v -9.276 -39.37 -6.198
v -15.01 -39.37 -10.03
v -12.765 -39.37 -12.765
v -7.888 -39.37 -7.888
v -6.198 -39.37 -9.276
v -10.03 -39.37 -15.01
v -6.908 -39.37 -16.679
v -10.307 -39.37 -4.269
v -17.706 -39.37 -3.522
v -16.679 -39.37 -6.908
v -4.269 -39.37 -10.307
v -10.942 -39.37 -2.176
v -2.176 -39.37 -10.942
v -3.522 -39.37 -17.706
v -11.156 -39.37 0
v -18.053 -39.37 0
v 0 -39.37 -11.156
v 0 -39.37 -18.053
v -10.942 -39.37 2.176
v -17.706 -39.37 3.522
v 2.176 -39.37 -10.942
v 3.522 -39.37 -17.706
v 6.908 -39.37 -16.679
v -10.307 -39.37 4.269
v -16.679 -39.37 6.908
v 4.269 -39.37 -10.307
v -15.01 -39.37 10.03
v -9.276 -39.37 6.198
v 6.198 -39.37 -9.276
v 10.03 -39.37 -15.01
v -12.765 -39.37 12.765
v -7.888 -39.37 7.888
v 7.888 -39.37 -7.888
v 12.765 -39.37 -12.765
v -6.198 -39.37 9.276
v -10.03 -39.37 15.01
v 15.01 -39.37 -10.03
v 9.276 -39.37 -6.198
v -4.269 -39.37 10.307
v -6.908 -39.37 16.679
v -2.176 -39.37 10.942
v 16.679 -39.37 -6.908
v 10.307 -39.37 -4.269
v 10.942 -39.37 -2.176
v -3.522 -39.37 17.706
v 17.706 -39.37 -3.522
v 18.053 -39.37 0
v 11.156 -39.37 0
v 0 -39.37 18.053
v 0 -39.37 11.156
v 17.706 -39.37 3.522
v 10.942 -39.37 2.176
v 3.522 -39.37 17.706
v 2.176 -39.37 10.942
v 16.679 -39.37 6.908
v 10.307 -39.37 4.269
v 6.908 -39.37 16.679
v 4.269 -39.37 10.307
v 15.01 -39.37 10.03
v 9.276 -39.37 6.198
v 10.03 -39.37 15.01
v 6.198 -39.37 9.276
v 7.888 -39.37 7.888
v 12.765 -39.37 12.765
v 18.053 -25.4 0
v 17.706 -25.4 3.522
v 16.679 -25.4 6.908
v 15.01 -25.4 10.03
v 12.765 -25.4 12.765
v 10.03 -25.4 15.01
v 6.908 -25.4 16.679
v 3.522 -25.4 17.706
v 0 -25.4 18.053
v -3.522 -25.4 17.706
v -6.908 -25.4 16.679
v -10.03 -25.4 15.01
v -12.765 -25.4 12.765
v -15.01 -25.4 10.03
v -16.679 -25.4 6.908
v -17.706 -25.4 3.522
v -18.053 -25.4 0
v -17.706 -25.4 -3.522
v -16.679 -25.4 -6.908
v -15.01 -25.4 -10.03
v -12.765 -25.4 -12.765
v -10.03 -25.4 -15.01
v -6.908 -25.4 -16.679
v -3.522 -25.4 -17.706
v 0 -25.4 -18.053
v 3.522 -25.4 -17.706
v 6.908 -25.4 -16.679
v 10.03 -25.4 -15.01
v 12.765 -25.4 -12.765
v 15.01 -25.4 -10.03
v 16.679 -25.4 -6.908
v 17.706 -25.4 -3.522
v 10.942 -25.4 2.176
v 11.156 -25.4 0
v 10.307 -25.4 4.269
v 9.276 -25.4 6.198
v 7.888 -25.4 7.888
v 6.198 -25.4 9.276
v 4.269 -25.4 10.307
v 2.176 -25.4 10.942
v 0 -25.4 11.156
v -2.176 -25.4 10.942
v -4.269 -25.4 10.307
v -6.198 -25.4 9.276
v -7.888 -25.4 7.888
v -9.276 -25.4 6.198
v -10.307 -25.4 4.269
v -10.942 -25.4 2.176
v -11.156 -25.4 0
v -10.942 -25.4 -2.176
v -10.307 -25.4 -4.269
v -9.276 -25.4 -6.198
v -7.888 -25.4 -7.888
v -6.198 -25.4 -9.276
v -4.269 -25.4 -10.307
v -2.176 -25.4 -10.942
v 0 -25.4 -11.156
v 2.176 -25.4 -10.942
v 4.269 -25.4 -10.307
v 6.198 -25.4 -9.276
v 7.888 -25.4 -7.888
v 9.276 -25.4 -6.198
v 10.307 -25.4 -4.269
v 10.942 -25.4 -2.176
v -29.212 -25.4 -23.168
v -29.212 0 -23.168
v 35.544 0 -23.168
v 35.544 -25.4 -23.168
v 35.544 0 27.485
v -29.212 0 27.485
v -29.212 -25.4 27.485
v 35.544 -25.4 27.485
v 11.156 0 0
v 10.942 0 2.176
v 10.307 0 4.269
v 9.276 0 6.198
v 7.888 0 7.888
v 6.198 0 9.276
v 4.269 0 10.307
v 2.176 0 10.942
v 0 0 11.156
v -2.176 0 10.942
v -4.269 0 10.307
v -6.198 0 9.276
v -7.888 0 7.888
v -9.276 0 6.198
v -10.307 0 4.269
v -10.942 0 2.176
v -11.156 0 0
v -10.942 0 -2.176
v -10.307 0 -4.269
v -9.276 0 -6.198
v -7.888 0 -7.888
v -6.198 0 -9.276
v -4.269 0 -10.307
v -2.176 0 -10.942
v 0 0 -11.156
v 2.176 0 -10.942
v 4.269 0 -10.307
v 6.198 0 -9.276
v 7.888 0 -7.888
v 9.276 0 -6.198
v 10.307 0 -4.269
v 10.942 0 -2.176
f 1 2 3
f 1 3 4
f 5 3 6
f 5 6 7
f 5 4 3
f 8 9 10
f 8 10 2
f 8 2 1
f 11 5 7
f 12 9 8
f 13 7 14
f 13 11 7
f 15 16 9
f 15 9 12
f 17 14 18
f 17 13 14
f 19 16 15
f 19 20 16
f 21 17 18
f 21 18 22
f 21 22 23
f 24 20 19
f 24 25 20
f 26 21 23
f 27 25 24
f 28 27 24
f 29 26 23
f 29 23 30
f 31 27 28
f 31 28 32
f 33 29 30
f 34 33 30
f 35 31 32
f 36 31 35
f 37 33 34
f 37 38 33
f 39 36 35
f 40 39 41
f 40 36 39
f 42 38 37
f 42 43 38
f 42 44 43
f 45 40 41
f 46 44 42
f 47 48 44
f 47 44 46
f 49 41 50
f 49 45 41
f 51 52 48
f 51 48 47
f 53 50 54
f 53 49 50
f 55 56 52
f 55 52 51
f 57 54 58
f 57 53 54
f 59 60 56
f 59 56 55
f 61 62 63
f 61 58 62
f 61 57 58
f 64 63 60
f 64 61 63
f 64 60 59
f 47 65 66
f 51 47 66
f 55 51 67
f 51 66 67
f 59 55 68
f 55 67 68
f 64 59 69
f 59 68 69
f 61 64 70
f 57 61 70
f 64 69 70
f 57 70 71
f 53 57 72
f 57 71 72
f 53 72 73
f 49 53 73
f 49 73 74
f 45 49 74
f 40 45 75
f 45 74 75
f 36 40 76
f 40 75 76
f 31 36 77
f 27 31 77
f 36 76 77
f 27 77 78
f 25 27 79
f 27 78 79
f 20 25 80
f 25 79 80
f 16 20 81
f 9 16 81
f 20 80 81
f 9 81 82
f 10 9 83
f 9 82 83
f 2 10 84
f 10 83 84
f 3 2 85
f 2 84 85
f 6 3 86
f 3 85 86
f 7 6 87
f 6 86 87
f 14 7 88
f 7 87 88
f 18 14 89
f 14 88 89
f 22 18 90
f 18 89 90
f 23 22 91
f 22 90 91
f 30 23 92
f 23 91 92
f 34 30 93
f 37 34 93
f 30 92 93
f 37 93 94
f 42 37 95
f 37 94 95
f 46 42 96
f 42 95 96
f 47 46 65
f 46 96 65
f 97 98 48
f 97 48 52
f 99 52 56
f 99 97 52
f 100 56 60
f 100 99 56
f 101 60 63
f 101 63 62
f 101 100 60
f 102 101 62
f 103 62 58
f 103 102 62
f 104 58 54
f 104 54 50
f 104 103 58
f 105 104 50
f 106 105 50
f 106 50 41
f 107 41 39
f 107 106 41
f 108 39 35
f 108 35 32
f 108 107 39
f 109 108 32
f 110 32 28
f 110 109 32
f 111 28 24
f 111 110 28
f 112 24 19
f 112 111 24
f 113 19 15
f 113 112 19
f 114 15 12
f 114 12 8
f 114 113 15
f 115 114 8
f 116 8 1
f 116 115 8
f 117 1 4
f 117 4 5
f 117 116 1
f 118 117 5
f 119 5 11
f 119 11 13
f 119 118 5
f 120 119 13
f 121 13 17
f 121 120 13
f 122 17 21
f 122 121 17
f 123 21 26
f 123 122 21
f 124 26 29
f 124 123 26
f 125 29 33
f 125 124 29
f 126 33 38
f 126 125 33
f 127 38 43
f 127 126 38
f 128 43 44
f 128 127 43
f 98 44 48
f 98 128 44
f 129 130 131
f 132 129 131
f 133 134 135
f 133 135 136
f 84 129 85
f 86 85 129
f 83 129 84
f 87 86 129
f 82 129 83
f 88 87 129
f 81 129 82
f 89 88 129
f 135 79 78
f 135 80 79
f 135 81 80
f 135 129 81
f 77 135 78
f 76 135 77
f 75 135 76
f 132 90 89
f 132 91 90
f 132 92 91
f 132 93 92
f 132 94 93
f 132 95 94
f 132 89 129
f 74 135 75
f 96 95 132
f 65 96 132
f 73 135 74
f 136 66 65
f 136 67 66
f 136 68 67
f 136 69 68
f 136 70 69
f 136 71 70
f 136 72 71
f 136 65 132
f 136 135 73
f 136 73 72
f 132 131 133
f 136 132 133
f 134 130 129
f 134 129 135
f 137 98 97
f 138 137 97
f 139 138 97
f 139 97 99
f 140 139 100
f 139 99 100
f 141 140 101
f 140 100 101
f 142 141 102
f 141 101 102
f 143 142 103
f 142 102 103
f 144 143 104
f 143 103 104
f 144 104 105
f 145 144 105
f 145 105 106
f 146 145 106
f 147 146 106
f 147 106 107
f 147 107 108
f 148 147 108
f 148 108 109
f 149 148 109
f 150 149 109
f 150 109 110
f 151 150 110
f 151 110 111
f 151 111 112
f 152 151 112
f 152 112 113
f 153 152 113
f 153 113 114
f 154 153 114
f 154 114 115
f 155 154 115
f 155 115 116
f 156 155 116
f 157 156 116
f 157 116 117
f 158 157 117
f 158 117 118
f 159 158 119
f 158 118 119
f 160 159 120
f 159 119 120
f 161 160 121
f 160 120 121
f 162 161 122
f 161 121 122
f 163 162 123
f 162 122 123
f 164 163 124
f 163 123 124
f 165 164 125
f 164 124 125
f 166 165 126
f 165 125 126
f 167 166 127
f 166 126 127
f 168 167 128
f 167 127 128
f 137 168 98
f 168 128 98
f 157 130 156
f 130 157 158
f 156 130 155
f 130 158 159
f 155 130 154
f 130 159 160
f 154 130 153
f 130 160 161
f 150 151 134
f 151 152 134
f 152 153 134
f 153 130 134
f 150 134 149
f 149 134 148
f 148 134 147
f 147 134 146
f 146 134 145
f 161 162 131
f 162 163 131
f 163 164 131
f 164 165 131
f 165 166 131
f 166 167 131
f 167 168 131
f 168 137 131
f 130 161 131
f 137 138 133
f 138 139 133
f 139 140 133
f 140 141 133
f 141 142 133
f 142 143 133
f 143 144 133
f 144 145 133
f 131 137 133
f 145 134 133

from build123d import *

# Parameters (mm, degrees)
F0_W     = 64.7562947124
F0_H     = 50.6538115442
F1_DEPTH = 25.4
F2_R     = 11.1559539437
F3_DEPTH = 50.292
F4_R     = 18.0527377002
F4_R_2   = 11.1559539437
F5_DEPTH = 13.97


with BuildPart() as f1:
    # F0 (on Front) → F1 (new body)
    with BuildSketch(Plane.XZ):
        with Locations((3.1658643857, 2.158543095)):
            Rectangle(F0_W, F0_H)
    extrude(amount=F1_DEPTH)

    # F2 (on face) → F3 (cut)
    with BuildSketch(Plane.XZ.offset(25.4)):
        Circle(F2_R)
    extrude(amount=-F3_DEPTH, mode=Mode.SUBTRACT)

    # F4 (on face) → F5 (join)
    with BuildSketch(Plane.XZ.offset(25.4)):
        Circle(F4_R)
        Circle(F4_R_2, mode=Mode.SUBTRACT)
    extrude(amount=F5_DEPTH)


solid = f1.part
